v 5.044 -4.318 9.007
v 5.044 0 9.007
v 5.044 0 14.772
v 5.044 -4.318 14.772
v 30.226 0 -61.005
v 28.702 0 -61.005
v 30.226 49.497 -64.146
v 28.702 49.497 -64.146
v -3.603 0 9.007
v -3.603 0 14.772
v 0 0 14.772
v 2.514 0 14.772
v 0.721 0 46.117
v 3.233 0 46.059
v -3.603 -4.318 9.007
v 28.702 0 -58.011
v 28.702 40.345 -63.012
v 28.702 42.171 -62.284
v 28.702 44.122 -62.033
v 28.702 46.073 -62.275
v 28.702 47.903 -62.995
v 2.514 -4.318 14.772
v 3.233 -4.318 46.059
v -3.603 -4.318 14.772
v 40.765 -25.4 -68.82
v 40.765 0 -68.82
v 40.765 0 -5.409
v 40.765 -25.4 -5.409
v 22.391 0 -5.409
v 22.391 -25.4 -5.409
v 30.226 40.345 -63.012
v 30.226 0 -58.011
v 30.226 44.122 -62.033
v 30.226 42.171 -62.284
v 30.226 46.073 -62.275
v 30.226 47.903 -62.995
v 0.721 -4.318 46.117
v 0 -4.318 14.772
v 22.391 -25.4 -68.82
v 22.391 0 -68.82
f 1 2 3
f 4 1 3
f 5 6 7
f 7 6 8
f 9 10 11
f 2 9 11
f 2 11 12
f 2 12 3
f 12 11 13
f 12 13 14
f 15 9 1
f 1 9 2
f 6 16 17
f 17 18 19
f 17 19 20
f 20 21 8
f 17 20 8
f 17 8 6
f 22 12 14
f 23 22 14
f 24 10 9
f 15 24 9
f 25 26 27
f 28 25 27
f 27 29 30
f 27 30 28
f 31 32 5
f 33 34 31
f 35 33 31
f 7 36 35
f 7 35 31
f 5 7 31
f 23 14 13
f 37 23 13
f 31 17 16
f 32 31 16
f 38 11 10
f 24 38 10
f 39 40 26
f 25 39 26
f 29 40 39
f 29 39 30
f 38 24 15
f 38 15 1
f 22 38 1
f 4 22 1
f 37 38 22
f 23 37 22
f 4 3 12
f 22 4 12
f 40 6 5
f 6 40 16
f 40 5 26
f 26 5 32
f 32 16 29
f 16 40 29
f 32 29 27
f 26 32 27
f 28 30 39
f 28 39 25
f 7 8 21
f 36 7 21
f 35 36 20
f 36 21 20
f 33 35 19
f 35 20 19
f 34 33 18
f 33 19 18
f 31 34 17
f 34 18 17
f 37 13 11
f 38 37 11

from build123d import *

# Parameters (mm, degrees)
F0_W     = 8.6468746886
F0_H     = 5.4042972624
F1_DEPTH = 4.318
F2_W     = 18.3746088296
F2_H     = 63.4104190394
F3_DEPTH = 25.4
F5_START = 28.702
F5_DEPTH = 1.524


with BuildPart() as f1:
    # F0 (on Front) → F1 (new body)
    with BuildSketch(Plane.XZ):
        Polygon((-3.6028688774, 14.7717408836), (-3.6028688774, 14.4114550203), (5.0440058112, 14.4114550203), (5.0440058112, 14.7717408836), (2.5137216441, 14.7717408836), (0, 14.7717408836), align=None)
        with Locations((0.7205684669, 11.7093063891)):
            Rectangle(F0_W, F0_H)
        Polygon((0.7205684669, 46.1166612804), (0, 14.7717408836), (2.5137216441, 14.7717408836), (3.2329623989, 46.058905452), align=None)
    extrude(amount=F1_DEPTH)


with BuildPart() as f3:
    # F2 (on Front) → F3 (new body)
    with BuildSketch(Plane.XZ):
        with Locations((31.5780965611, -37.1143282391)):
            Rectangle(F2_W, F2_H)
    extrude(amount=F3_DEPTH)

    # F4 (on Right) → F5 (join)
    with BuildSketch(Plane.YZ.offset(F5_START)):
        with BuildLine():
            Line((40.3447512022, -63.0118522667), (0, -58.0109395087))
            Line((0, -58.0109395087), (-0.3682676359, -60.9819303791))
            Line((-0.3682676359, -60.9819303791), (49.4968833778, -64.1463000746))
            ThreePointArc((49.4968833778, -64.1463000746), (45.1050205097, -62.0930208383), (40.3447512022, -63.0118522667))
        make_face()
    extrude(amount=F5_DEPTH)


solid = Compound([f1.part, f3.part])
